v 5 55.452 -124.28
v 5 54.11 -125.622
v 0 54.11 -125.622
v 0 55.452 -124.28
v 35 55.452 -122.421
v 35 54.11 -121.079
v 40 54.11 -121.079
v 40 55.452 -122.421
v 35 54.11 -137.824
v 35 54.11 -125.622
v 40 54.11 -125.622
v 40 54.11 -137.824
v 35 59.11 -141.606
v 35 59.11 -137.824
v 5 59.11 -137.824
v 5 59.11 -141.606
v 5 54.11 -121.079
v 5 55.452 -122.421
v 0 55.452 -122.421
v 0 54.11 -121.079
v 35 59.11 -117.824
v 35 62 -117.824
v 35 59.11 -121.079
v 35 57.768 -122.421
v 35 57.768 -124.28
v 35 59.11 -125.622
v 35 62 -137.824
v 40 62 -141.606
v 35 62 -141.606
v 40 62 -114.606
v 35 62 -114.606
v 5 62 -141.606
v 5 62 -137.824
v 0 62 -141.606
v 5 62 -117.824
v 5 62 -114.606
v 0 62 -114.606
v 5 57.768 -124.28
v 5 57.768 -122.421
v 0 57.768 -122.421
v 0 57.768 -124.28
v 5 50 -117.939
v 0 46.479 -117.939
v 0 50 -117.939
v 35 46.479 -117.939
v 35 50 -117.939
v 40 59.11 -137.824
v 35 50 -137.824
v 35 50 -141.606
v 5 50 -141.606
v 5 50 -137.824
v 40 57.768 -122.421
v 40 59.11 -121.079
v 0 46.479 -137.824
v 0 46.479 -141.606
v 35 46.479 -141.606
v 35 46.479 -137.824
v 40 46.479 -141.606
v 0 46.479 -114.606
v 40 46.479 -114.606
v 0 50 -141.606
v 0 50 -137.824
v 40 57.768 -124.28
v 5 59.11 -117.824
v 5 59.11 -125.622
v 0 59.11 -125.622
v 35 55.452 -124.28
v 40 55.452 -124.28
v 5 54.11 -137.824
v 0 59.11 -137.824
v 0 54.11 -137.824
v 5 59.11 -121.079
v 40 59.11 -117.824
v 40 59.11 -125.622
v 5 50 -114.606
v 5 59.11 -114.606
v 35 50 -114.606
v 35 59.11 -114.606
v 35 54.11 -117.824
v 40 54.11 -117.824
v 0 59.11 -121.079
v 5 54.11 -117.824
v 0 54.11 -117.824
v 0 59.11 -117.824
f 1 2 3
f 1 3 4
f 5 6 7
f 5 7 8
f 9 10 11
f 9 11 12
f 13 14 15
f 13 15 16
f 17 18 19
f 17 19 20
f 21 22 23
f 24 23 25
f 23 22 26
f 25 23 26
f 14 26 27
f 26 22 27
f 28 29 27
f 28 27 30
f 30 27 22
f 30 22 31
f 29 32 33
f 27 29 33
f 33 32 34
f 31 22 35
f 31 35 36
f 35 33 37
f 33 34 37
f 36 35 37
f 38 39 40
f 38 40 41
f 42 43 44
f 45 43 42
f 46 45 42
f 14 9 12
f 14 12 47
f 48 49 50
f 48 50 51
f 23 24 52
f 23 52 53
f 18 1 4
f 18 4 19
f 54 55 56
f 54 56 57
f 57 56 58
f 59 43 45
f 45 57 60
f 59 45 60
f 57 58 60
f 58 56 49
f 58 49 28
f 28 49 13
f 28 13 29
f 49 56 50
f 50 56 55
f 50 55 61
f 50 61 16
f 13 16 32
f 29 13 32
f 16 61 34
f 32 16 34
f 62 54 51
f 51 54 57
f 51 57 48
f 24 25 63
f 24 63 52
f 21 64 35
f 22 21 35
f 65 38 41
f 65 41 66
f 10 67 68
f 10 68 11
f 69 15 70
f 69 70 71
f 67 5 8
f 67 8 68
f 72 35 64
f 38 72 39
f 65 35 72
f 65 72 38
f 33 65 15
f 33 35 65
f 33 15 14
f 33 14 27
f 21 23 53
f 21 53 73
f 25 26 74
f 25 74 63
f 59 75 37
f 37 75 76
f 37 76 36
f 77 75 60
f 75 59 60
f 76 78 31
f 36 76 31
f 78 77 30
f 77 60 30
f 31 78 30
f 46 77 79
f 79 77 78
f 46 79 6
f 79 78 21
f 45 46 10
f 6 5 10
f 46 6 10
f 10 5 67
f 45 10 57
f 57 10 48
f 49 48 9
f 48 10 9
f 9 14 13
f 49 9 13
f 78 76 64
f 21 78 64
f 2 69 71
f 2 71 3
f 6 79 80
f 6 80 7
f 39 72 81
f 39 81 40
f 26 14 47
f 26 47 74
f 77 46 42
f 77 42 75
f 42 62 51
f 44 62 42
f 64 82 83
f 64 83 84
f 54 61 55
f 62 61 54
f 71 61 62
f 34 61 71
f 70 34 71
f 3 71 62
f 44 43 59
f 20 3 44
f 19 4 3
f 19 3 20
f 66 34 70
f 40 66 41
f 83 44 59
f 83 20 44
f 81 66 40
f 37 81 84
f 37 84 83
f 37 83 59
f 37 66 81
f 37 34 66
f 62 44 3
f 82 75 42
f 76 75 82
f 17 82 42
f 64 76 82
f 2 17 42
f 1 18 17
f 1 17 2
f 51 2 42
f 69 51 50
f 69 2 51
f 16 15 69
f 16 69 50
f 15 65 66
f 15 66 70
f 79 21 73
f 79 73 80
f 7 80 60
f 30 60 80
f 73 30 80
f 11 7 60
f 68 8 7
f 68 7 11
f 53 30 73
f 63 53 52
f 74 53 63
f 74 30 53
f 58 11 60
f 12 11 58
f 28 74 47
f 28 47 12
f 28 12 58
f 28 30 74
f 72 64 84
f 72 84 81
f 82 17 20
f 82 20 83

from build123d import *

# Parameters (mm, degrees)
SKETCH5_R           = 3
SKETCH5_W           = 20
SKETCH5_H           = 5
SKETCH5_W_2         = 12.659523363
SKETCH5_H_2         = 7.033068536
BOSS_EXTRUDE1_DEPTH = 5
SKETCH6_W           = 330
SKETCH6_H           = 15
BOSS_EXTRUDE2_DEPTH = 5
SKETCH8_R           = 2
SKETCH8_R_2         = 3.1
CUT_EXTRUDE1_DEPTH  = 5
SKETCH9_W           = 27
SKETCH9_H           = 12
BOSS_EXTRUDE3_DEPTH = 5
SKETCH10_W          = 3.217546145
SKETCH10_H          = 2.890079535
SKETCH10_W_2        = 3.782453855
SKETCH10_H_2        = 3.521306538
SKETCH10_W_3        = 3.332881198
BOSS_EXTRUDE4_DEPTH = 30
BOSS_EXTRUDE6_DEPTH = 5
CUT_EXTRUDE4_DEPTH  = 14.3
SKETCH15_W          = 3.332881198
SKETCH15_H          = 3.521306538
SKETCH15_W_2        = 3.782453855
BOSS_EXTRUDE9_DEPTH = 14.3


with BuildPart() as part:
    # Sketch5 → Boss-Extrude1 (new body)
    with BuildSketch(Plane(origin=(0, 0, 0), x_dir=(0, 0, -1), z_dir=(1, 0, 0))):
        with BuildLine():
            Line((-40, -10), (0, -10))
            Line((0, -10), (0, 0))
            Line((0, 0), (0, 10))
            Line((0, 10), (5, 10))
            Line((5, 10), (5, 0))
            Line((5, 0), (5, -10))
            Line((5, -10), (245, -10))
            Line((245, -10), (245, 0))
            Line((245, 0), (245, 10))
            Line((245, 10), (250, 10))
            Line((250, 10), (250, 0))
            Line((250, 0), (250, -10))
            Line((250, -10), (290, -10))
            Line((290, -10), (290, 50))
            Line((290, 50), (-7.797224701, 50))
            Line((-7.797224701, 50), (-7.797224701, 69.428123594))
            ThreePointArc((-7.797224701, 69.428123594), (-10.726156889, 76.499191405), (-17.797224701, 79.428123594))
            Line((-17.797224701, 79.428123594), (-30, 79.428123594))
            ThreePointArc((-30, 79.428123594), (-37.071067812, 76.499191405), (-40, 69.428123594))
            Line((-40, 69.428123594), (-40, 50))
            Line((-40, 50), (-40, -10))
        make_face()
        with Locations((-25, 35)):
            Circle(SKETCH5_R, mode=Mode.SUBTRACT)
        with Locations((275, 35)):
            Circle(SKETCH5_R, mode=Mode.SUBTRACT)
        with Locations((89.606343961, 41.844097949)):
            Rectangle(SKETCH5_W, SKETCH5_H, mode=Mode.SUBTRACT)
        with Locations((14.606343961, 41.844097949)):
            Rectangle(SKETCH5_W, SKETCH5_H, mode=Mode.SUBTRACT)
        with Locations((-23.96746302, 63.333382994)):
            Rectangle(SKETCH5_W_2, SKETCH5_H_2, mode=Mode.SUBTRACT)
        with Locations((164.606343961, 41.844097949)):
            Rectangle(SKETCH5_W, SKETCH5_H, mode=Mode.SUBTRACT)
        with Locations((239.606343961, 41.844097949)):
            Rectangle(SKETCH5_W, SKETCH5_H, mode=Mode.SUBTRACT)
    extrude(amount=BOSS_EXTRUDE1_DEPTH)

    # Sketch6 → Boss-Extrude2 (add)
    with BuildSketch(Plane(origin=(5, 0, 0), x_dir=(0, 0, -1), z_dir=(1, 0, 0))):
        with Locations((125, -17.5)):
            Rectangle(SKETCH6_W, SKETCH6_H)
    extrude(amount=-BOSS_EXTRUDE2_DEPTH)

    # Sketch8 → Cut-Extrude1 (cut)
    with BuildSketch(Plane(origin=(5, 0, 0), x_dir=(0, 0, -1), z_dir=(1, 0, 0))):
        with Locations((30.968640194, 16)):
            Circle(SKETCH8_R)
        with Locations((30.968640194, -20)):
            Circle(SKETCH8_R)
        with Locations(Location((66.968640194, -20, 0), (0, 0, 180))):
            Circle(SKETCH8_R)
        with Locations(Location((66.968640194, 16, 0), (0, 0, 180))):
            Circle(SKETCH8_R)
        with Locations((48.968640194, -2)):
            Circle(SKETCH8_R_2)
    extrude(amount=-CUT_EXTRUDE1_DEPTH, mode=Mode.SUBTRACT)

    # Sketch9 → Boss-Extrude3 (add)
    with BuildSketch(Plane(origin=(5, 0, 0), x_dir=(0, 0, -1), z_dir=(1, 0, 0))):
        with Locations((128.106343961, 56)):
            Rectangle(SKETCH9_W, SKETCH9_H)
        Polygon((121.079302135, 59.109920465), (122.421377926, 57.767844673), (124.280039233, 57.767844673), (125.622115024, 59.109920465), (137.823890106, 59.109920465), (137.823890106, 54.109920465), (125.622115024, 54.109920465), (124.280039233, 55.451996257), (122.421377926, 55.451996257), (121.079302135, 54.109920465), (117.823890106, 54.109920465), (117.823890106, 59.109920465), align=None, mode=Mode.SUBTRACT)
    extrude(amount=-BOSS_EXTRUDE3_DEPTH)

    # Sketch10 → Boss-Extrude4 (add)
    with BuildSketch(Plane(origin=(5, 0, 0), x_dir=(0, 0, -1), z_dir=(1, 0, 0))):
        with Locations((116.215117034, 60.554960233)):
            Rectangle(SKETCH10_W, SKETCH10_H)
        with Locations((139.715117034, 60.554960233)):
            Rectangle(SKETCH10_W_2, SKETCH10_H)
        with Locations((139.715117034, 48.239346731)):
            Rectangle(SKETCH10_W_2, SKETCH10_H_2)
        with Locations((116.27278456, 48.239346731)):
            Rectangle(SKETCH10_W_3, SKETCH10_H_2)
    extrude(amount=BOSS_EXTRUDE4_DEPTH)

    # Sketch13 → Boss-Extrude6 (add)
    with BuildSketch(Plane(origin=(35, 0, 0), x_dir=(0, 0, -1), z_dir=(1, 0, 0))):
        Polygon((114.606343961, 46.478693462), (141.606343961, 46.478693462), (141.606343961, 62), (117.823890106, 62), (114.606343961, 62), align=None)
        Polygon((117.823890106, 54.109920465), (121.079302135, 54.109920465), (122.421377926, 55.451996257), (124.280039233, 55.451996257), (125.622115024, 54.109920465), (137.823890106, 54.109920465), (137.823890106, 59.109920465), (125.622115024, 59.109920465), (124.280039233, 57.767844673), (122.421377926, 57.767844673), (121.079302135, 59.109920465), (117.823890106, 59.109920465), align=None, mode=Mode.SUBTRACT)
    extrude(amount=BOSS_EXTRUDE6_DEPTH)

    # Sketch14 → Cut-Extrude4 (cut)
    with BuildSketch(Plane.ZY):
        with BuildLine():
            Line((-141.606343961, 50), (-114.606343961, 50))
            Line((-114.606343961, 50), (7.797224701, 50))
            Line((7.797224701, 50), (7.797224701, 69.428123594))
            ThreePointArc((7.797224701, 69.428123594), (10.726156889, 76.499191405), (17.797224701, 79.428123594))
            Line((17.797224701, 79.428123594), (30, 79.428123594))
            ThreePointArc((30, 79.428123594), (37.071067812, 76.499191405), (40, 69.428123594))
            Line((40, 69.428123594), (40, -25))
            Line((40, -25), (-290, -25))
            Line((-290, -25), (-290, 50))
            Line((-290, 50), (-141.606343961, 50))
        make_face()
    extrude(amount=-CUT_EXTRUDE4_DEPTH, mode=Mode.SUBTRACT)

    # Sketch15 → Boss-Extrude9 (add)
    with BuildSketch(Plane.ZY.offset(-14.3)):
        with Locations((-116.27278456, 48.239346731)):
            Rectangle(SKETCH15_W, SKETCH15_H)
        with Locations((-139.715117034, 48.239346731)):
            Rectangle(SKETCH15_W_2, SKETCH15_H)
    extrude(amount=BOSS_EXTRUDE9_DEPTH)


solid = part.part
